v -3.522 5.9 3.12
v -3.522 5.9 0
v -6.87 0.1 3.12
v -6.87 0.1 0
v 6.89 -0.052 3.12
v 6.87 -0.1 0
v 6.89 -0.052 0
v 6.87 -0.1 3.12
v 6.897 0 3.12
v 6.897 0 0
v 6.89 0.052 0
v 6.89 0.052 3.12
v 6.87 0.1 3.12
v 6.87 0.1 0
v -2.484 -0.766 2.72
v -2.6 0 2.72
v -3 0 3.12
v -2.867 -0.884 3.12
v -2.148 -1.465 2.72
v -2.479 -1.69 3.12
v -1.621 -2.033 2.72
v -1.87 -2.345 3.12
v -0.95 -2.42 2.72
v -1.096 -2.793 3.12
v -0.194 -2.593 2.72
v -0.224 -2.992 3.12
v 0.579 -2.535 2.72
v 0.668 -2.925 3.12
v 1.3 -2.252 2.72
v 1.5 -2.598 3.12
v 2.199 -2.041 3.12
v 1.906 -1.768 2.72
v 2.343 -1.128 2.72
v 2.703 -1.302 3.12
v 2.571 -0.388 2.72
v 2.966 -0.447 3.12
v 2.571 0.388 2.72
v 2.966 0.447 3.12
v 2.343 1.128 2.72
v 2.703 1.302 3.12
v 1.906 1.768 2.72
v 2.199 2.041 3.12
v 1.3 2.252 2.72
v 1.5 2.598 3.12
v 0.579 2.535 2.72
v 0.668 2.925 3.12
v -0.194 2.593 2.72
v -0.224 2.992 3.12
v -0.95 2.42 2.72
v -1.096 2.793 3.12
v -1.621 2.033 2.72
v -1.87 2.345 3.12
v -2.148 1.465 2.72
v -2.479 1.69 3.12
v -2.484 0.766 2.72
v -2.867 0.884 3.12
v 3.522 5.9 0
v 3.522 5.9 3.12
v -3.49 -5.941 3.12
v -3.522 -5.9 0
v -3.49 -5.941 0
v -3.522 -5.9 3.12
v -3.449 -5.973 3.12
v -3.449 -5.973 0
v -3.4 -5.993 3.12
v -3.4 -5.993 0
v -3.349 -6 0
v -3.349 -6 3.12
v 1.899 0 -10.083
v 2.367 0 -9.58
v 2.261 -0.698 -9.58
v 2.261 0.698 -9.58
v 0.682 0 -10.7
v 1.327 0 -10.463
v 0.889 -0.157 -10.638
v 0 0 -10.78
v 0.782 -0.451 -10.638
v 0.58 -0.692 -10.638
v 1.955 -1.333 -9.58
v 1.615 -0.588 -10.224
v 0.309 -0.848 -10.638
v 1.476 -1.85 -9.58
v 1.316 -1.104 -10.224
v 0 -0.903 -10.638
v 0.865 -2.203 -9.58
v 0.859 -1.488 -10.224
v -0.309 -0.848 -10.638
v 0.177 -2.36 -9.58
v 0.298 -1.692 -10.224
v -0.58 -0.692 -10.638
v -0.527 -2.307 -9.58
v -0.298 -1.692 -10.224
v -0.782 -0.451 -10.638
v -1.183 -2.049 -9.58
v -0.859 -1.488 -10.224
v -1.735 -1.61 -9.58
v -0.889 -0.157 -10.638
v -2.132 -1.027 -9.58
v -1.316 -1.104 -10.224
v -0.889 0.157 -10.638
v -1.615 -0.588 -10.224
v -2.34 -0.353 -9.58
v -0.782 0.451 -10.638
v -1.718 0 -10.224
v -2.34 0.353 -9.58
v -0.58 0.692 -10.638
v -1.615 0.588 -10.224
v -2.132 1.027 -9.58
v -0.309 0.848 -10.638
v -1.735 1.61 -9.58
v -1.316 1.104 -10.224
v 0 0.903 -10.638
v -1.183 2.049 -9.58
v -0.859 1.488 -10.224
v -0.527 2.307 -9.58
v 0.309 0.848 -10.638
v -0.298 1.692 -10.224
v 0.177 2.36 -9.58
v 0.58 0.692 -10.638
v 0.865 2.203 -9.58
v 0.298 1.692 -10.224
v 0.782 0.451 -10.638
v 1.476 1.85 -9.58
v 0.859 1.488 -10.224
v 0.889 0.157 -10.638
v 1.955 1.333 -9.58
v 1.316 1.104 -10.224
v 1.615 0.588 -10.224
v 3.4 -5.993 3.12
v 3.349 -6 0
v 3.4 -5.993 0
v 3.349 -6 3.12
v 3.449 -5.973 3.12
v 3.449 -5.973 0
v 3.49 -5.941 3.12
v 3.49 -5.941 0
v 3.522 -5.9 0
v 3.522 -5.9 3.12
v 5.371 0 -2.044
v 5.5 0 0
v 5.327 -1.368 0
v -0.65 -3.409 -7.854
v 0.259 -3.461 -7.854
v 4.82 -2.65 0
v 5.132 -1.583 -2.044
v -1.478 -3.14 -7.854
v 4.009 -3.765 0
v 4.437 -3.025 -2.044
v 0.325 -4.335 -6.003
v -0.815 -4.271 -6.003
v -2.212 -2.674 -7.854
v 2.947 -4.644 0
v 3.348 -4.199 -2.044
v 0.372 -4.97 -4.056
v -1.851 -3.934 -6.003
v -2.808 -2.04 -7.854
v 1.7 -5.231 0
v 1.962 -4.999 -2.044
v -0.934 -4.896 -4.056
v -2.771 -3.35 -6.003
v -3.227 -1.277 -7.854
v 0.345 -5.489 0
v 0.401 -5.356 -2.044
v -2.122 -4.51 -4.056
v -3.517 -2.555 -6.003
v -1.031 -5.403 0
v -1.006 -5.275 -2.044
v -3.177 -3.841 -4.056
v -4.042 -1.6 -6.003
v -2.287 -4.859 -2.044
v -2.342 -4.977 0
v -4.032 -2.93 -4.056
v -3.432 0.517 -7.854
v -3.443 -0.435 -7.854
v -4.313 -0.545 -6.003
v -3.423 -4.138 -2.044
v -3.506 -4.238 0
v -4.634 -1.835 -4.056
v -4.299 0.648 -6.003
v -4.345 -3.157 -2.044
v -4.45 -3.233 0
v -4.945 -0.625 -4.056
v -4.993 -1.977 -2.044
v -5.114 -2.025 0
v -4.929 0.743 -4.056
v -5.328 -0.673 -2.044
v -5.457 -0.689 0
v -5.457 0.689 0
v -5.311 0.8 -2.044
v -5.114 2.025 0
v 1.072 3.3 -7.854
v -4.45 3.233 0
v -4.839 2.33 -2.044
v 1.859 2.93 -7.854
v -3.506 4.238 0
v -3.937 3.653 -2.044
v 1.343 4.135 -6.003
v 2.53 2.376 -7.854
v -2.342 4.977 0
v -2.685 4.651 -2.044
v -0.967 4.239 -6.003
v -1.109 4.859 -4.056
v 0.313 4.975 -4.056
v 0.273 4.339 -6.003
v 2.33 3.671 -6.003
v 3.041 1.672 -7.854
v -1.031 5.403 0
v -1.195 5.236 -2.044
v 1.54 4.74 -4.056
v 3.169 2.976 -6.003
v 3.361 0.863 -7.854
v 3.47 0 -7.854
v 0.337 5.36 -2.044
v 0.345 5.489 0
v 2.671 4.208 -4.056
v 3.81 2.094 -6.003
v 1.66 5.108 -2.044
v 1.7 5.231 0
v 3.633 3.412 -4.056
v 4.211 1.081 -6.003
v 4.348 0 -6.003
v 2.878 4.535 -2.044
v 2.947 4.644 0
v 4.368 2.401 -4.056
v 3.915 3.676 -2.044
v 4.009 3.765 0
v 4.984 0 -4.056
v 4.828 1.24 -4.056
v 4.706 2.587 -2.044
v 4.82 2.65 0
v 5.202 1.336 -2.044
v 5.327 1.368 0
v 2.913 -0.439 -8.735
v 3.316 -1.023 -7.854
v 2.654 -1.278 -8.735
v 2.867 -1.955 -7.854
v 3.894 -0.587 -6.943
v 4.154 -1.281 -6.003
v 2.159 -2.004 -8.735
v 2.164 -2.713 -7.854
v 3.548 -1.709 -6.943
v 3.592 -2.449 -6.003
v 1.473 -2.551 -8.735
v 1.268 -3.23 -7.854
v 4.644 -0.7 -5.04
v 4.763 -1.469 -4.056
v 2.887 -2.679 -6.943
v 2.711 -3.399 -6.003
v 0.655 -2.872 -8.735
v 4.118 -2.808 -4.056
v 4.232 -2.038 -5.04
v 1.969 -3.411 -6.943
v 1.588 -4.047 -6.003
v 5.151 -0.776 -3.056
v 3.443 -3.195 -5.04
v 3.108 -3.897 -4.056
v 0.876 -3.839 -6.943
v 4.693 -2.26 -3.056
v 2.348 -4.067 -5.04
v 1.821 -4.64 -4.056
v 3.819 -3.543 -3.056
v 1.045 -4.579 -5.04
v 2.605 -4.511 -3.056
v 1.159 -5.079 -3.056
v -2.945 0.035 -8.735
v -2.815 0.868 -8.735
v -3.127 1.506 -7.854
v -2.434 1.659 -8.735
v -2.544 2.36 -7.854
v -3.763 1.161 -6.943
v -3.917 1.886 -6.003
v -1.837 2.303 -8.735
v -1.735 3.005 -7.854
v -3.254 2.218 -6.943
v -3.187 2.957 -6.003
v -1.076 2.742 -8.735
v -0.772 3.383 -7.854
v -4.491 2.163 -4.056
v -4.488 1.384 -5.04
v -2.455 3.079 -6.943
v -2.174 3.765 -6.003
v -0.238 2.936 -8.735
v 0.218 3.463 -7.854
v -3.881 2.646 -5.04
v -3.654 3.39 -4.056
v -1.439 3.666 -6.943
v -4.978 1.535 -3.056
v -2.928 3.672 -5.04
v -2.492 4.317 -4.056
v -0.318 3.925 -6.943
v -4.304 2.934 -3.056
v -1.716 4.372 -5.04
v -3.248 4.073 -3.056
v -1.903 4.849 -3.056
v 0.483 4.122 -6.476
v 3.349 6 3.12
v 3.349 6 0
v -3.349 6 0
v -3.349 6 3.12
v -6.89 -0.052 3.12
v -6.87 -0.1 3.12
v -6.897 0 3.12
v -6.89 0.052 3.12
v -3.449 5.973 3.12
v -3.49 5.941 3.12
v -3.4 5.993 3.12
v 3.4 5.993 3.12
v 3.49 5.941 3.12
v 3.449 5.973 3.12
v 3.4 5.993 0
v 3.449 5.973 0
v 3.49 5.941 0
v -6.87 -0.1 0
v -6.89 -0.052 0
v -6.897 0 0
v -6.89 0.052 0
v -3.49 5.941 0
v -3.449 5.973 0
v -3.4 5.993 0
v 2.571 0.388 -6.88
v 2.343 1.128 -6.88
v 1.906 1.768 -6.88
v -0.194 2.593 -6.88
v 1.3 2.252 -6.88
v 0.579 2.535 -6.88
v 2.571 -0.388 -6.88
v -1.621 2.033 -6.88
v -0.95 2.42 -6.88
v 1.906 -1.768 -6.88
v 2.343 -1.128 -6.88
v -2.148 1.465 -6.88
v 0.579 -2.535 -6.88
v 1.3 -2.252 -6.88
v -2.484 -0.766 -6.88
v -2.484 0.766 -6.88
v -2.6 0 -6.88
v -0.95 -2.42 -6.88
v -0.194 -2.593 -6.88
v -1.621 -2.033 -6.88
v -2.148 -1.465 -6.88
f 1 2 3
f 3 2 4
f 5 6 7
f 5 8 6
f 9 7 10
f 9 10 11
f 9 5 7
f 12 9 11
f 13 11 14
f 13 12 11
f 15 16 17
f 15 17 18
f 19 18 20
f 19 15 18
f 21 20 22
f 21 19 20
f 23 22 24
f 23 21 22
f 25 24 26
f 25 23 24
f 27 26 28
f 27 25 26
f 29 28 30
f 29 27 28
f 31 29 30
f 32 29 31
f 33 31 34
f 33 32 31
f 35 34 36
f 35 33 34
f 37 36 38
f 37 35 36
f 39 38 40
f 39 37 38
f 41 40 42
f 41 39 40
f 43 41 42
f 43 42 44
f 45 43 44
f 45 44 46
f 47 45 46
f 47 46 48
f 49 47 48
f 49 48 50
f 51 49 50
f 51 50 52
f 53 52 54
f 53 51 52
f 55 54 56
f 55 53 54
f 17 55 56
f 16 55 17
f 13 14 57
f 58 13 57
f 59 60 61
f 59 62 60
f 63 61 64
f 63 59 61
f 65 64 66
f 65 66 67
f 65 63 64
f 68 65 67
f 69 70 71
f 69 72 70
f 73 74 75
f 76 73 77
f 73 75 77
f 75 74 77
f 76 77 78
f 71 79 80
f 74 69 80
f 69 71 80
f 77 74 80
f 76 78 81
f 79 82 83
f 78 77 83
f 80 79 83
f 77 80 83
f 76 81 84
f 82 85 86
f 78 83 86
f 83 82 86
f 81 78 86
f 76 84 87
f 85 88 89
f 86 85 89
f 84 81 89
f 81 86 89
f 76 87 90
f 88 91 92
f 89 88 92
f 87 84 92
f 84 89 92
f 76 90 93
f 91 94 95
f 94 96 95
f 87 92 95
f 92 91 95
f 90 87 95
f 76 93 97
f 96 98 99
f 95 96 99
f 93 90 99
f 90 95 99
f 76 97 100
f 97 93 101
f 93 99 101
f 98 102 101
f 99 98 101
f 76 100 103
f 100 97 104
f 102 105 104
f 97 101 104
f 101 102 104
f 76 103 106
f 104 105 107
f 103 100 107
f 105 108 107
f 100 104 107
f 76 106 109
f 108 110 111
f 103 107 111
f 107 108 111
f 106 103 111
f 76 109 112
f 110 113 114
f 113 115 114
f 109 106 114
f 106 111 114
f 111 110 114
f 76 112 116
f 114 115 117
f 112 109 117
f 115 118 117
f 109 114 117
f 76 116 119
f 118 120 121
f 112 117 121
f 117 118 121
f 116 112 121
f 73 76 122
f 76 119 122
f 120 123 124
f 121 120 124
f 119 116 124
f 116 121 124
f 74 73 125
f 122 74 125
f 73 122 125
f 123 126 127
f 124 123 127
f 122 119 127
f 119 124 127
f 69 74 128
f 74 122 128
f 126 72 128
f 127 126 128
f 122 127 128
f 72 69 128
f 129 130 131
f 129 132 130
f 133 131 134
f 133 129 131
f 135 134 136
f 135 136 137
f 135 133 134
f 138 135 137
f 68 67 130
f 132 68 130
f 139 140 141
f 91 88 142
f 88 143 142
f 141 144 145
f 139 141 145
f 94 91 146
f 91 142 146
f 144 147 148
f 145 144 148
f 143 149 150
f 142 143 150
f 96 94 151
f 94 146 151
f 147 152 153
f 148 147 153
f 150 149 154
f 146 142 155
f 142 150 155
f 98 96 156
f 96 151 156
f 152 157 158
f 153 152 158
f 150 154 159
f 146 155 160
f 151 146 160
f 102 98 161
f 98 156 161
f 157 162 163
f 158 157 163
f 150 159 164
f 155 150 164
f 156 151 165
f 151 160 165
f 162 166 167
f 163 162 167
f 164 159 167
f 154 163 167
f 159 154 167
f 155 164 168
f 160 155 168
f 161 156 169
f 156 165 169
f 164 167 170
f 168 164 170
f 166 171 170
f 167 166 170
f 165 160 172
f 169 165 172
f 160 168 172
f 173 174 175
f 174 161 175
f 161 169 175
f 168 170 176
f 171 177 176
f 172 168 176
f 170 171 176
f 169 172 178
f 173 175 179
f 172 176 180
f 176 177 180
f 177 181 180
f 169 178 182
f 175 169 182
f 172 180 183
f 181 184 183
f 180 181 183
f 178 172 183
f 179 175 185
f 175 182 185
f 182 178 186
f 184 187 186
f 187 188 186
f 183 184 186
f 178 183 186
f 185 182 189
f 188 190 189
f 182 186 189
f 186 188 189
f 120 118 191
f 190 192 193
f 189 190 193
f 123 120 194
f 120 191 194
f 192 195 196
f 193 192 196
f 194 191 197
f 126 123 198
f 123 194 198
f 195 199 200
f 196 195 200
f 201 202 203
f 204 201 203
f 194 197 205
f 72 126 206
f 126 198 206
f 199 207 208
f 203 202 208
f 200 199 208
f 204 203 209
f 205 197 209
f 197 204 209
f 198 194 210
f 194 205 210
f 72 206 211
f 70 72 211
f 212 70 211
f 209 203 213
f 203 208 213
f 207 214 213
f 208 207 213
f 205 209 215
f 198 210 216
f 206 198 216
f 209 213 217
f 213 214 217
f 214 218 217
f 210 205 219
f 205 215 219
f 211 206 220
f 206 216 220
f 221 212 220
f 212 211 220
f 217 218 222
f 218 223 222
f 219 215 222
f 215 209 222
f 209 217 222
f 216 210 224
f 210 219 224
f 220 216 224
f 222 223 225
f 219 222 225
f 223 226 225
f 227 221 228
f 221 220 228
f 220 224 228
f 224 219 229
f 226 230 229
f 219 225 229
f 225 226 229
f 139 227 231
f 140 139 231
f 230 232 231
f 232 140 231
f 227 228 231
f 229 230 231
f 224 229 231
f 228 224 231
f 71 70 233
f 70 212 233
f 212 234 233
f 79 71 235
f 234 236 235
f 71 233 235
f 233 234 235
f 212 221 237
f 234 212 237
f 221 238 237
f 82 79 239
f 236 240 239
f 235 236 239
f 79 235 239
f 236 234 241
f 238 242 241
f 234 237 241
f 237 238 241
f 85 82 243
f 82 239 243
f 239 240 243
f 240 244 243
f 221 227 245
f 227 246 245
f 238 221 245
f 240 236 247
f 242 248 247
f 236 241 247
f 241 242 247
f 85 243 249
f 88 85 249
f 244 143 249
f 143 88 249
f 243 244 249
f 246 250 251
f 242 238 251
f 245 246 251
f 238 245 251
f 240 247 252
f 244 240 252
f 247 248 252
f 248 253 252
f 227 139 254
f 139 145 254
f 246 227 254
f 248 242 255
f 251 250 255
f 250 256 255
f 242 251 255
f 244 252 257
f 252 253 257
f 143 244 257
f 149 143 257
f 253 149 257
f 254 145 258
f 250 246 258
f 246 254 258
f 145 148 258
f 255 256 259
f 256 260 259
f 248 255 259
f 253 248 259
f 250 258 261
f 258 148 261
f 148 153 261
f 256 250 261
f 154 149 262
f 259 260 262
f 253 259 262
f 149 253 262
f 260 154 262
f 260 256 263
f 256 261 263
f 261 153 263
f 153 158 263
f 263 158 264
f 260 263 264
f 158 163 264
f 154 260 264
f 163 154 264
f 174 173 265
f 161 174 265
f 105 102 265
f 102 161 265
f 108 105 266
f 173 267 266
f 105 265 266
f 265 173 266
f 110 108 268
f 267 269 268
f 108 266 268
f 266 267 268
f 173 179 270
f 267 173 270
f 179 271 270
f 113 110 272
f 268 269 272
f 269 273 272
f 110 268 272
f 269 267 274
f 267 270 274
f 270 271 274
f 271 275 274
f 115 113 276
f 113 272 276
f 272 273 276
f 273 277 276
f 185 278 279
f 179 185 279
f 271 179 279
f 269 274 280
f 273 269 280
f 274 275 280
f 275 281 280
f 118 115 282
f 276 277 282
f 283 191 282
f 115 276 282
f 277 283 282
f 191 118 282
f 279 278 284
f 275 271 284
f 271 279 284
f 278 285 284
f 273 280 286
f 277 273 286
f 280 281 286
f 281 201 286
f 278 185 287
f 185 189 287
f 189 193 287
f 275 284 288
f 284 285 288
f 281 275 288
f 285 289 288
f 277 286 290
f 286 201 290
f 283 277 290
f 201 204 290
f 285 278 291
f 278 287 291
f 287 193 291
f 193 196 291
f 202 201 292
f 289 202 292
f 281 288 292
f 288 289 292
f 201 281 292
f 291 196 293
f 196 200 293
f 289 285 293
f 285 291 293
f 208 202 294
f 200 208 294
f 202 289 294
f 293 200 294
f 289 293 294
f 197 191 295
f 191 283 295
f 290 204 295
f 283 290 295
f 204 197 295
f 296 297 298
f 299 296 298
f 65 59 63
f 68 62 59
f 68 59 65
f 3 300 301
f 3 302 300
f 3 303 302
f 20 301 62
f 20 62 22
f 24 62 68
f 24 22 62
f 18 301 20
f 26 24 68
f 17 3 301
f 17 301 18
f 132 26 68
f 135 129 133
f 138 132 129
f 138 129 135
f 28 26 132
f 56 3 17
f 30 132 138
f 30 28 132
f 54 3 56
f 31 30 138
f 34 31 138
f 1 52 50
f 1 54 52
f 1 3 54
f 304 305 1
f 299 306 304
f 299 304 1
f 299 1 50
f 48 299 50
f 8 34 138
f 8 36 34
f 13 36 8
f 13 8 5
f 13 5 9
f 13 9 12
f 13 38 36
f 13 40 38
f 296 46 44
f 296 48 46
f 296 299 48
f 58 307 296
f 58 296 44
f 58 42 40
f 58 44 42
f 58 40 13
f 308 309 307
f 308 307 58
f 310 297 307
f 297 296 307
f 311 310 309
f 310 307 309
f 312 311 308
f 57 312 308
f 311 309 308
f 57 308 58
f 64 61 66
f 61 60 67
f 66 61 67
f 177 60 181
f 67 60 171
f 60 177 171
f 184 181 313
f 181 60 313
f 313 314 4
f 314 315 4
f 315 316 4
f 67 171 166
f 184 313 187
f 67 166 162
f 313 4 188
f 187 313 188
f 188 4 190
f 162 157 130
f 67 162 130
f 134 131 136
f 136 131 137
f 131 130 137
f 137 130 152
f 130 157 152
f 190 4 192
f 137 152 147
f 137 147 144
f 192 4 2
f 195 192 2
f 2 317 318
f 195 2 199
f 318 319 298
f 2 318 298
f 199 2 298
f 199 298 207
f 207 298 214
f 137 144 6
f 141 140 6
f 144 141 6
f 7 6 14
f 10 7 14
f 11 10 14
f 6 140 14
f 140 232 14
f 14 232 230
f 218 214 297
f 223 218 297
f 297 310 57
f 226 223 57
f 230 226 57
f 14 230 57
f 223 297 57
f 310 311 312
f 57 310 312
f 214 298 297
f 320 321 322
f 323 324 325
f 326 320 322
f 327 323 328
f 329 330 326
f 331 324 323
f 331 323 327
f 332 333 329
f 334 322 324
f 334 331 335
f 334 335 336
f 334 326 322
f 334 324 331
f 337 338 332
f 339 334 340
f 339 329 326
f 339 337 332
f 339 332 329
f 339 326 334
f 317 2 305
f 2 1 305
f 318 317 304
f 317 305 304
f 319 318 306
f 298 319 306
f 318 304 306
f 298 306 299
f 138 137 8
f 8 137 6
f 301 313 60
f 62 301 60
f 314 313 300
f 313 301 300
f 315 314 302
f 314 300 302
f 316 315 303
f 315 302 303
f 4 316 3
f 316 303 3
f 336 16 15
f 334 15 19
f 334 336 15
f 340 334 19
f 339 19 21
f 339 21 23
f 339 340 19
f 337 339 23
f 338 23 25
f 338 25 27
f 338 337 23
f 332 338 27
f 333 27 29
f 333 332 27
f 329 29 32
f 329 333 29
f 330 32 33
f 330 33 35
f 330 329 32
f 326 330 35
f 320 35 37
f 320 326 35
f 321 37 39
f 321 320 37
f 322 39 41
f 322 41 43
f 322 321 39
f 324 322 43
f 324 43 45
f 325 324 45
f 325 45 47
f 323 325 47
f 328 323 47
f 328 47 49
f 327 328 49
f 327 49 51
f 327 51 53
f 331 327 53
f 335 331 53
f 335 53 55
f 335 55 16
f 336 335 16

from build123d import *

# Parameters (mm, degrees)
ESQUISSE2_R      = 2.6
EXTRUSION1_DEPTH = 3.12
EXTRUSION2_START = -10
ESQUISSE4_R      = 2.6
EXTRUSION2_DEPTH = 10
CONG_1_R         = 0.2
CHANFREIN1_SIZE  = 0.4


with BuildPart() as part:
    # Esquisse2 → Extrusion1 (new body)
    with BuildSketch(Plane.XY):
        Polygon((6.92820323, 0), (3.464101615, 6), (-3.464101615, 6), (-6.92820323, 0), (-3.464101615, -6), (3.464101615, -6), align=None)
        with Locations(Location((0, 0, 0), (0, 0, 180))):
            Circle(ESQUISSE2_R, mode=Mode.SUBTRACT)
    extrude(amount=EXTRUSION1_DEPTH)

    # Esquisse3 → Révolution1 (revolve)
    with BuildSketch(Plane(origin=(0, 0, 0), x_dir=(1, 0, 0), z_dir=(0, 1, 0))):
        with BuildLine():
            Line((5.5, 0), (0, 0))
            Line((0, 0), (0, 10.78))
            ThreePointArc((0, 10.78), (1.326705119, 10.462857182), (2.366555702, 9.58))
            ThreePointArc((2.366555702, 9.58), (4.696738417, 5.039714108), (5.5, 0))
        make_face()
    revolve(axis=Axis((0, 0, 0), (0, 0, -1)))

    # Esquisse4 → Extrusion2 (cut)
    with BuildSketch(Plane.XY.offset(3.12).offset(EXTRUSION2_START)):
        with Locations(Location((0, 0, 0), (0, 0, 180))):
            Circle(ESQUISSE4_R)
    extrude(amount=EXTRUSION2_DEPTH, mode=Mode.SUBTRACT)

    # Congé1
    cong_1_edges = [part.edges().sort_by_distance(p)[0] for p in [
        (-3.464101615, -6, 1.56),
        (-6.92820323, 0, 1.56),
        (-3.464101615, 6, 1.56),
        (3.464101615, 6, 1.56),
        (6.92820323, 0, 1.56),
        (3.464101615, -6, 1.56),
    ]]
    fillet(cong_1_edges, radius=CONG_1_R)

    # Chanfrein1
    chanfrein1_edges = [part.edges().sort_by_distance(p)[0] for p in [
        (2.6, 0, 3.12),
    ]]
    chamfer(chanfrein1_edges, length=CHANFREIN1_SIZE)


solid = part.part
